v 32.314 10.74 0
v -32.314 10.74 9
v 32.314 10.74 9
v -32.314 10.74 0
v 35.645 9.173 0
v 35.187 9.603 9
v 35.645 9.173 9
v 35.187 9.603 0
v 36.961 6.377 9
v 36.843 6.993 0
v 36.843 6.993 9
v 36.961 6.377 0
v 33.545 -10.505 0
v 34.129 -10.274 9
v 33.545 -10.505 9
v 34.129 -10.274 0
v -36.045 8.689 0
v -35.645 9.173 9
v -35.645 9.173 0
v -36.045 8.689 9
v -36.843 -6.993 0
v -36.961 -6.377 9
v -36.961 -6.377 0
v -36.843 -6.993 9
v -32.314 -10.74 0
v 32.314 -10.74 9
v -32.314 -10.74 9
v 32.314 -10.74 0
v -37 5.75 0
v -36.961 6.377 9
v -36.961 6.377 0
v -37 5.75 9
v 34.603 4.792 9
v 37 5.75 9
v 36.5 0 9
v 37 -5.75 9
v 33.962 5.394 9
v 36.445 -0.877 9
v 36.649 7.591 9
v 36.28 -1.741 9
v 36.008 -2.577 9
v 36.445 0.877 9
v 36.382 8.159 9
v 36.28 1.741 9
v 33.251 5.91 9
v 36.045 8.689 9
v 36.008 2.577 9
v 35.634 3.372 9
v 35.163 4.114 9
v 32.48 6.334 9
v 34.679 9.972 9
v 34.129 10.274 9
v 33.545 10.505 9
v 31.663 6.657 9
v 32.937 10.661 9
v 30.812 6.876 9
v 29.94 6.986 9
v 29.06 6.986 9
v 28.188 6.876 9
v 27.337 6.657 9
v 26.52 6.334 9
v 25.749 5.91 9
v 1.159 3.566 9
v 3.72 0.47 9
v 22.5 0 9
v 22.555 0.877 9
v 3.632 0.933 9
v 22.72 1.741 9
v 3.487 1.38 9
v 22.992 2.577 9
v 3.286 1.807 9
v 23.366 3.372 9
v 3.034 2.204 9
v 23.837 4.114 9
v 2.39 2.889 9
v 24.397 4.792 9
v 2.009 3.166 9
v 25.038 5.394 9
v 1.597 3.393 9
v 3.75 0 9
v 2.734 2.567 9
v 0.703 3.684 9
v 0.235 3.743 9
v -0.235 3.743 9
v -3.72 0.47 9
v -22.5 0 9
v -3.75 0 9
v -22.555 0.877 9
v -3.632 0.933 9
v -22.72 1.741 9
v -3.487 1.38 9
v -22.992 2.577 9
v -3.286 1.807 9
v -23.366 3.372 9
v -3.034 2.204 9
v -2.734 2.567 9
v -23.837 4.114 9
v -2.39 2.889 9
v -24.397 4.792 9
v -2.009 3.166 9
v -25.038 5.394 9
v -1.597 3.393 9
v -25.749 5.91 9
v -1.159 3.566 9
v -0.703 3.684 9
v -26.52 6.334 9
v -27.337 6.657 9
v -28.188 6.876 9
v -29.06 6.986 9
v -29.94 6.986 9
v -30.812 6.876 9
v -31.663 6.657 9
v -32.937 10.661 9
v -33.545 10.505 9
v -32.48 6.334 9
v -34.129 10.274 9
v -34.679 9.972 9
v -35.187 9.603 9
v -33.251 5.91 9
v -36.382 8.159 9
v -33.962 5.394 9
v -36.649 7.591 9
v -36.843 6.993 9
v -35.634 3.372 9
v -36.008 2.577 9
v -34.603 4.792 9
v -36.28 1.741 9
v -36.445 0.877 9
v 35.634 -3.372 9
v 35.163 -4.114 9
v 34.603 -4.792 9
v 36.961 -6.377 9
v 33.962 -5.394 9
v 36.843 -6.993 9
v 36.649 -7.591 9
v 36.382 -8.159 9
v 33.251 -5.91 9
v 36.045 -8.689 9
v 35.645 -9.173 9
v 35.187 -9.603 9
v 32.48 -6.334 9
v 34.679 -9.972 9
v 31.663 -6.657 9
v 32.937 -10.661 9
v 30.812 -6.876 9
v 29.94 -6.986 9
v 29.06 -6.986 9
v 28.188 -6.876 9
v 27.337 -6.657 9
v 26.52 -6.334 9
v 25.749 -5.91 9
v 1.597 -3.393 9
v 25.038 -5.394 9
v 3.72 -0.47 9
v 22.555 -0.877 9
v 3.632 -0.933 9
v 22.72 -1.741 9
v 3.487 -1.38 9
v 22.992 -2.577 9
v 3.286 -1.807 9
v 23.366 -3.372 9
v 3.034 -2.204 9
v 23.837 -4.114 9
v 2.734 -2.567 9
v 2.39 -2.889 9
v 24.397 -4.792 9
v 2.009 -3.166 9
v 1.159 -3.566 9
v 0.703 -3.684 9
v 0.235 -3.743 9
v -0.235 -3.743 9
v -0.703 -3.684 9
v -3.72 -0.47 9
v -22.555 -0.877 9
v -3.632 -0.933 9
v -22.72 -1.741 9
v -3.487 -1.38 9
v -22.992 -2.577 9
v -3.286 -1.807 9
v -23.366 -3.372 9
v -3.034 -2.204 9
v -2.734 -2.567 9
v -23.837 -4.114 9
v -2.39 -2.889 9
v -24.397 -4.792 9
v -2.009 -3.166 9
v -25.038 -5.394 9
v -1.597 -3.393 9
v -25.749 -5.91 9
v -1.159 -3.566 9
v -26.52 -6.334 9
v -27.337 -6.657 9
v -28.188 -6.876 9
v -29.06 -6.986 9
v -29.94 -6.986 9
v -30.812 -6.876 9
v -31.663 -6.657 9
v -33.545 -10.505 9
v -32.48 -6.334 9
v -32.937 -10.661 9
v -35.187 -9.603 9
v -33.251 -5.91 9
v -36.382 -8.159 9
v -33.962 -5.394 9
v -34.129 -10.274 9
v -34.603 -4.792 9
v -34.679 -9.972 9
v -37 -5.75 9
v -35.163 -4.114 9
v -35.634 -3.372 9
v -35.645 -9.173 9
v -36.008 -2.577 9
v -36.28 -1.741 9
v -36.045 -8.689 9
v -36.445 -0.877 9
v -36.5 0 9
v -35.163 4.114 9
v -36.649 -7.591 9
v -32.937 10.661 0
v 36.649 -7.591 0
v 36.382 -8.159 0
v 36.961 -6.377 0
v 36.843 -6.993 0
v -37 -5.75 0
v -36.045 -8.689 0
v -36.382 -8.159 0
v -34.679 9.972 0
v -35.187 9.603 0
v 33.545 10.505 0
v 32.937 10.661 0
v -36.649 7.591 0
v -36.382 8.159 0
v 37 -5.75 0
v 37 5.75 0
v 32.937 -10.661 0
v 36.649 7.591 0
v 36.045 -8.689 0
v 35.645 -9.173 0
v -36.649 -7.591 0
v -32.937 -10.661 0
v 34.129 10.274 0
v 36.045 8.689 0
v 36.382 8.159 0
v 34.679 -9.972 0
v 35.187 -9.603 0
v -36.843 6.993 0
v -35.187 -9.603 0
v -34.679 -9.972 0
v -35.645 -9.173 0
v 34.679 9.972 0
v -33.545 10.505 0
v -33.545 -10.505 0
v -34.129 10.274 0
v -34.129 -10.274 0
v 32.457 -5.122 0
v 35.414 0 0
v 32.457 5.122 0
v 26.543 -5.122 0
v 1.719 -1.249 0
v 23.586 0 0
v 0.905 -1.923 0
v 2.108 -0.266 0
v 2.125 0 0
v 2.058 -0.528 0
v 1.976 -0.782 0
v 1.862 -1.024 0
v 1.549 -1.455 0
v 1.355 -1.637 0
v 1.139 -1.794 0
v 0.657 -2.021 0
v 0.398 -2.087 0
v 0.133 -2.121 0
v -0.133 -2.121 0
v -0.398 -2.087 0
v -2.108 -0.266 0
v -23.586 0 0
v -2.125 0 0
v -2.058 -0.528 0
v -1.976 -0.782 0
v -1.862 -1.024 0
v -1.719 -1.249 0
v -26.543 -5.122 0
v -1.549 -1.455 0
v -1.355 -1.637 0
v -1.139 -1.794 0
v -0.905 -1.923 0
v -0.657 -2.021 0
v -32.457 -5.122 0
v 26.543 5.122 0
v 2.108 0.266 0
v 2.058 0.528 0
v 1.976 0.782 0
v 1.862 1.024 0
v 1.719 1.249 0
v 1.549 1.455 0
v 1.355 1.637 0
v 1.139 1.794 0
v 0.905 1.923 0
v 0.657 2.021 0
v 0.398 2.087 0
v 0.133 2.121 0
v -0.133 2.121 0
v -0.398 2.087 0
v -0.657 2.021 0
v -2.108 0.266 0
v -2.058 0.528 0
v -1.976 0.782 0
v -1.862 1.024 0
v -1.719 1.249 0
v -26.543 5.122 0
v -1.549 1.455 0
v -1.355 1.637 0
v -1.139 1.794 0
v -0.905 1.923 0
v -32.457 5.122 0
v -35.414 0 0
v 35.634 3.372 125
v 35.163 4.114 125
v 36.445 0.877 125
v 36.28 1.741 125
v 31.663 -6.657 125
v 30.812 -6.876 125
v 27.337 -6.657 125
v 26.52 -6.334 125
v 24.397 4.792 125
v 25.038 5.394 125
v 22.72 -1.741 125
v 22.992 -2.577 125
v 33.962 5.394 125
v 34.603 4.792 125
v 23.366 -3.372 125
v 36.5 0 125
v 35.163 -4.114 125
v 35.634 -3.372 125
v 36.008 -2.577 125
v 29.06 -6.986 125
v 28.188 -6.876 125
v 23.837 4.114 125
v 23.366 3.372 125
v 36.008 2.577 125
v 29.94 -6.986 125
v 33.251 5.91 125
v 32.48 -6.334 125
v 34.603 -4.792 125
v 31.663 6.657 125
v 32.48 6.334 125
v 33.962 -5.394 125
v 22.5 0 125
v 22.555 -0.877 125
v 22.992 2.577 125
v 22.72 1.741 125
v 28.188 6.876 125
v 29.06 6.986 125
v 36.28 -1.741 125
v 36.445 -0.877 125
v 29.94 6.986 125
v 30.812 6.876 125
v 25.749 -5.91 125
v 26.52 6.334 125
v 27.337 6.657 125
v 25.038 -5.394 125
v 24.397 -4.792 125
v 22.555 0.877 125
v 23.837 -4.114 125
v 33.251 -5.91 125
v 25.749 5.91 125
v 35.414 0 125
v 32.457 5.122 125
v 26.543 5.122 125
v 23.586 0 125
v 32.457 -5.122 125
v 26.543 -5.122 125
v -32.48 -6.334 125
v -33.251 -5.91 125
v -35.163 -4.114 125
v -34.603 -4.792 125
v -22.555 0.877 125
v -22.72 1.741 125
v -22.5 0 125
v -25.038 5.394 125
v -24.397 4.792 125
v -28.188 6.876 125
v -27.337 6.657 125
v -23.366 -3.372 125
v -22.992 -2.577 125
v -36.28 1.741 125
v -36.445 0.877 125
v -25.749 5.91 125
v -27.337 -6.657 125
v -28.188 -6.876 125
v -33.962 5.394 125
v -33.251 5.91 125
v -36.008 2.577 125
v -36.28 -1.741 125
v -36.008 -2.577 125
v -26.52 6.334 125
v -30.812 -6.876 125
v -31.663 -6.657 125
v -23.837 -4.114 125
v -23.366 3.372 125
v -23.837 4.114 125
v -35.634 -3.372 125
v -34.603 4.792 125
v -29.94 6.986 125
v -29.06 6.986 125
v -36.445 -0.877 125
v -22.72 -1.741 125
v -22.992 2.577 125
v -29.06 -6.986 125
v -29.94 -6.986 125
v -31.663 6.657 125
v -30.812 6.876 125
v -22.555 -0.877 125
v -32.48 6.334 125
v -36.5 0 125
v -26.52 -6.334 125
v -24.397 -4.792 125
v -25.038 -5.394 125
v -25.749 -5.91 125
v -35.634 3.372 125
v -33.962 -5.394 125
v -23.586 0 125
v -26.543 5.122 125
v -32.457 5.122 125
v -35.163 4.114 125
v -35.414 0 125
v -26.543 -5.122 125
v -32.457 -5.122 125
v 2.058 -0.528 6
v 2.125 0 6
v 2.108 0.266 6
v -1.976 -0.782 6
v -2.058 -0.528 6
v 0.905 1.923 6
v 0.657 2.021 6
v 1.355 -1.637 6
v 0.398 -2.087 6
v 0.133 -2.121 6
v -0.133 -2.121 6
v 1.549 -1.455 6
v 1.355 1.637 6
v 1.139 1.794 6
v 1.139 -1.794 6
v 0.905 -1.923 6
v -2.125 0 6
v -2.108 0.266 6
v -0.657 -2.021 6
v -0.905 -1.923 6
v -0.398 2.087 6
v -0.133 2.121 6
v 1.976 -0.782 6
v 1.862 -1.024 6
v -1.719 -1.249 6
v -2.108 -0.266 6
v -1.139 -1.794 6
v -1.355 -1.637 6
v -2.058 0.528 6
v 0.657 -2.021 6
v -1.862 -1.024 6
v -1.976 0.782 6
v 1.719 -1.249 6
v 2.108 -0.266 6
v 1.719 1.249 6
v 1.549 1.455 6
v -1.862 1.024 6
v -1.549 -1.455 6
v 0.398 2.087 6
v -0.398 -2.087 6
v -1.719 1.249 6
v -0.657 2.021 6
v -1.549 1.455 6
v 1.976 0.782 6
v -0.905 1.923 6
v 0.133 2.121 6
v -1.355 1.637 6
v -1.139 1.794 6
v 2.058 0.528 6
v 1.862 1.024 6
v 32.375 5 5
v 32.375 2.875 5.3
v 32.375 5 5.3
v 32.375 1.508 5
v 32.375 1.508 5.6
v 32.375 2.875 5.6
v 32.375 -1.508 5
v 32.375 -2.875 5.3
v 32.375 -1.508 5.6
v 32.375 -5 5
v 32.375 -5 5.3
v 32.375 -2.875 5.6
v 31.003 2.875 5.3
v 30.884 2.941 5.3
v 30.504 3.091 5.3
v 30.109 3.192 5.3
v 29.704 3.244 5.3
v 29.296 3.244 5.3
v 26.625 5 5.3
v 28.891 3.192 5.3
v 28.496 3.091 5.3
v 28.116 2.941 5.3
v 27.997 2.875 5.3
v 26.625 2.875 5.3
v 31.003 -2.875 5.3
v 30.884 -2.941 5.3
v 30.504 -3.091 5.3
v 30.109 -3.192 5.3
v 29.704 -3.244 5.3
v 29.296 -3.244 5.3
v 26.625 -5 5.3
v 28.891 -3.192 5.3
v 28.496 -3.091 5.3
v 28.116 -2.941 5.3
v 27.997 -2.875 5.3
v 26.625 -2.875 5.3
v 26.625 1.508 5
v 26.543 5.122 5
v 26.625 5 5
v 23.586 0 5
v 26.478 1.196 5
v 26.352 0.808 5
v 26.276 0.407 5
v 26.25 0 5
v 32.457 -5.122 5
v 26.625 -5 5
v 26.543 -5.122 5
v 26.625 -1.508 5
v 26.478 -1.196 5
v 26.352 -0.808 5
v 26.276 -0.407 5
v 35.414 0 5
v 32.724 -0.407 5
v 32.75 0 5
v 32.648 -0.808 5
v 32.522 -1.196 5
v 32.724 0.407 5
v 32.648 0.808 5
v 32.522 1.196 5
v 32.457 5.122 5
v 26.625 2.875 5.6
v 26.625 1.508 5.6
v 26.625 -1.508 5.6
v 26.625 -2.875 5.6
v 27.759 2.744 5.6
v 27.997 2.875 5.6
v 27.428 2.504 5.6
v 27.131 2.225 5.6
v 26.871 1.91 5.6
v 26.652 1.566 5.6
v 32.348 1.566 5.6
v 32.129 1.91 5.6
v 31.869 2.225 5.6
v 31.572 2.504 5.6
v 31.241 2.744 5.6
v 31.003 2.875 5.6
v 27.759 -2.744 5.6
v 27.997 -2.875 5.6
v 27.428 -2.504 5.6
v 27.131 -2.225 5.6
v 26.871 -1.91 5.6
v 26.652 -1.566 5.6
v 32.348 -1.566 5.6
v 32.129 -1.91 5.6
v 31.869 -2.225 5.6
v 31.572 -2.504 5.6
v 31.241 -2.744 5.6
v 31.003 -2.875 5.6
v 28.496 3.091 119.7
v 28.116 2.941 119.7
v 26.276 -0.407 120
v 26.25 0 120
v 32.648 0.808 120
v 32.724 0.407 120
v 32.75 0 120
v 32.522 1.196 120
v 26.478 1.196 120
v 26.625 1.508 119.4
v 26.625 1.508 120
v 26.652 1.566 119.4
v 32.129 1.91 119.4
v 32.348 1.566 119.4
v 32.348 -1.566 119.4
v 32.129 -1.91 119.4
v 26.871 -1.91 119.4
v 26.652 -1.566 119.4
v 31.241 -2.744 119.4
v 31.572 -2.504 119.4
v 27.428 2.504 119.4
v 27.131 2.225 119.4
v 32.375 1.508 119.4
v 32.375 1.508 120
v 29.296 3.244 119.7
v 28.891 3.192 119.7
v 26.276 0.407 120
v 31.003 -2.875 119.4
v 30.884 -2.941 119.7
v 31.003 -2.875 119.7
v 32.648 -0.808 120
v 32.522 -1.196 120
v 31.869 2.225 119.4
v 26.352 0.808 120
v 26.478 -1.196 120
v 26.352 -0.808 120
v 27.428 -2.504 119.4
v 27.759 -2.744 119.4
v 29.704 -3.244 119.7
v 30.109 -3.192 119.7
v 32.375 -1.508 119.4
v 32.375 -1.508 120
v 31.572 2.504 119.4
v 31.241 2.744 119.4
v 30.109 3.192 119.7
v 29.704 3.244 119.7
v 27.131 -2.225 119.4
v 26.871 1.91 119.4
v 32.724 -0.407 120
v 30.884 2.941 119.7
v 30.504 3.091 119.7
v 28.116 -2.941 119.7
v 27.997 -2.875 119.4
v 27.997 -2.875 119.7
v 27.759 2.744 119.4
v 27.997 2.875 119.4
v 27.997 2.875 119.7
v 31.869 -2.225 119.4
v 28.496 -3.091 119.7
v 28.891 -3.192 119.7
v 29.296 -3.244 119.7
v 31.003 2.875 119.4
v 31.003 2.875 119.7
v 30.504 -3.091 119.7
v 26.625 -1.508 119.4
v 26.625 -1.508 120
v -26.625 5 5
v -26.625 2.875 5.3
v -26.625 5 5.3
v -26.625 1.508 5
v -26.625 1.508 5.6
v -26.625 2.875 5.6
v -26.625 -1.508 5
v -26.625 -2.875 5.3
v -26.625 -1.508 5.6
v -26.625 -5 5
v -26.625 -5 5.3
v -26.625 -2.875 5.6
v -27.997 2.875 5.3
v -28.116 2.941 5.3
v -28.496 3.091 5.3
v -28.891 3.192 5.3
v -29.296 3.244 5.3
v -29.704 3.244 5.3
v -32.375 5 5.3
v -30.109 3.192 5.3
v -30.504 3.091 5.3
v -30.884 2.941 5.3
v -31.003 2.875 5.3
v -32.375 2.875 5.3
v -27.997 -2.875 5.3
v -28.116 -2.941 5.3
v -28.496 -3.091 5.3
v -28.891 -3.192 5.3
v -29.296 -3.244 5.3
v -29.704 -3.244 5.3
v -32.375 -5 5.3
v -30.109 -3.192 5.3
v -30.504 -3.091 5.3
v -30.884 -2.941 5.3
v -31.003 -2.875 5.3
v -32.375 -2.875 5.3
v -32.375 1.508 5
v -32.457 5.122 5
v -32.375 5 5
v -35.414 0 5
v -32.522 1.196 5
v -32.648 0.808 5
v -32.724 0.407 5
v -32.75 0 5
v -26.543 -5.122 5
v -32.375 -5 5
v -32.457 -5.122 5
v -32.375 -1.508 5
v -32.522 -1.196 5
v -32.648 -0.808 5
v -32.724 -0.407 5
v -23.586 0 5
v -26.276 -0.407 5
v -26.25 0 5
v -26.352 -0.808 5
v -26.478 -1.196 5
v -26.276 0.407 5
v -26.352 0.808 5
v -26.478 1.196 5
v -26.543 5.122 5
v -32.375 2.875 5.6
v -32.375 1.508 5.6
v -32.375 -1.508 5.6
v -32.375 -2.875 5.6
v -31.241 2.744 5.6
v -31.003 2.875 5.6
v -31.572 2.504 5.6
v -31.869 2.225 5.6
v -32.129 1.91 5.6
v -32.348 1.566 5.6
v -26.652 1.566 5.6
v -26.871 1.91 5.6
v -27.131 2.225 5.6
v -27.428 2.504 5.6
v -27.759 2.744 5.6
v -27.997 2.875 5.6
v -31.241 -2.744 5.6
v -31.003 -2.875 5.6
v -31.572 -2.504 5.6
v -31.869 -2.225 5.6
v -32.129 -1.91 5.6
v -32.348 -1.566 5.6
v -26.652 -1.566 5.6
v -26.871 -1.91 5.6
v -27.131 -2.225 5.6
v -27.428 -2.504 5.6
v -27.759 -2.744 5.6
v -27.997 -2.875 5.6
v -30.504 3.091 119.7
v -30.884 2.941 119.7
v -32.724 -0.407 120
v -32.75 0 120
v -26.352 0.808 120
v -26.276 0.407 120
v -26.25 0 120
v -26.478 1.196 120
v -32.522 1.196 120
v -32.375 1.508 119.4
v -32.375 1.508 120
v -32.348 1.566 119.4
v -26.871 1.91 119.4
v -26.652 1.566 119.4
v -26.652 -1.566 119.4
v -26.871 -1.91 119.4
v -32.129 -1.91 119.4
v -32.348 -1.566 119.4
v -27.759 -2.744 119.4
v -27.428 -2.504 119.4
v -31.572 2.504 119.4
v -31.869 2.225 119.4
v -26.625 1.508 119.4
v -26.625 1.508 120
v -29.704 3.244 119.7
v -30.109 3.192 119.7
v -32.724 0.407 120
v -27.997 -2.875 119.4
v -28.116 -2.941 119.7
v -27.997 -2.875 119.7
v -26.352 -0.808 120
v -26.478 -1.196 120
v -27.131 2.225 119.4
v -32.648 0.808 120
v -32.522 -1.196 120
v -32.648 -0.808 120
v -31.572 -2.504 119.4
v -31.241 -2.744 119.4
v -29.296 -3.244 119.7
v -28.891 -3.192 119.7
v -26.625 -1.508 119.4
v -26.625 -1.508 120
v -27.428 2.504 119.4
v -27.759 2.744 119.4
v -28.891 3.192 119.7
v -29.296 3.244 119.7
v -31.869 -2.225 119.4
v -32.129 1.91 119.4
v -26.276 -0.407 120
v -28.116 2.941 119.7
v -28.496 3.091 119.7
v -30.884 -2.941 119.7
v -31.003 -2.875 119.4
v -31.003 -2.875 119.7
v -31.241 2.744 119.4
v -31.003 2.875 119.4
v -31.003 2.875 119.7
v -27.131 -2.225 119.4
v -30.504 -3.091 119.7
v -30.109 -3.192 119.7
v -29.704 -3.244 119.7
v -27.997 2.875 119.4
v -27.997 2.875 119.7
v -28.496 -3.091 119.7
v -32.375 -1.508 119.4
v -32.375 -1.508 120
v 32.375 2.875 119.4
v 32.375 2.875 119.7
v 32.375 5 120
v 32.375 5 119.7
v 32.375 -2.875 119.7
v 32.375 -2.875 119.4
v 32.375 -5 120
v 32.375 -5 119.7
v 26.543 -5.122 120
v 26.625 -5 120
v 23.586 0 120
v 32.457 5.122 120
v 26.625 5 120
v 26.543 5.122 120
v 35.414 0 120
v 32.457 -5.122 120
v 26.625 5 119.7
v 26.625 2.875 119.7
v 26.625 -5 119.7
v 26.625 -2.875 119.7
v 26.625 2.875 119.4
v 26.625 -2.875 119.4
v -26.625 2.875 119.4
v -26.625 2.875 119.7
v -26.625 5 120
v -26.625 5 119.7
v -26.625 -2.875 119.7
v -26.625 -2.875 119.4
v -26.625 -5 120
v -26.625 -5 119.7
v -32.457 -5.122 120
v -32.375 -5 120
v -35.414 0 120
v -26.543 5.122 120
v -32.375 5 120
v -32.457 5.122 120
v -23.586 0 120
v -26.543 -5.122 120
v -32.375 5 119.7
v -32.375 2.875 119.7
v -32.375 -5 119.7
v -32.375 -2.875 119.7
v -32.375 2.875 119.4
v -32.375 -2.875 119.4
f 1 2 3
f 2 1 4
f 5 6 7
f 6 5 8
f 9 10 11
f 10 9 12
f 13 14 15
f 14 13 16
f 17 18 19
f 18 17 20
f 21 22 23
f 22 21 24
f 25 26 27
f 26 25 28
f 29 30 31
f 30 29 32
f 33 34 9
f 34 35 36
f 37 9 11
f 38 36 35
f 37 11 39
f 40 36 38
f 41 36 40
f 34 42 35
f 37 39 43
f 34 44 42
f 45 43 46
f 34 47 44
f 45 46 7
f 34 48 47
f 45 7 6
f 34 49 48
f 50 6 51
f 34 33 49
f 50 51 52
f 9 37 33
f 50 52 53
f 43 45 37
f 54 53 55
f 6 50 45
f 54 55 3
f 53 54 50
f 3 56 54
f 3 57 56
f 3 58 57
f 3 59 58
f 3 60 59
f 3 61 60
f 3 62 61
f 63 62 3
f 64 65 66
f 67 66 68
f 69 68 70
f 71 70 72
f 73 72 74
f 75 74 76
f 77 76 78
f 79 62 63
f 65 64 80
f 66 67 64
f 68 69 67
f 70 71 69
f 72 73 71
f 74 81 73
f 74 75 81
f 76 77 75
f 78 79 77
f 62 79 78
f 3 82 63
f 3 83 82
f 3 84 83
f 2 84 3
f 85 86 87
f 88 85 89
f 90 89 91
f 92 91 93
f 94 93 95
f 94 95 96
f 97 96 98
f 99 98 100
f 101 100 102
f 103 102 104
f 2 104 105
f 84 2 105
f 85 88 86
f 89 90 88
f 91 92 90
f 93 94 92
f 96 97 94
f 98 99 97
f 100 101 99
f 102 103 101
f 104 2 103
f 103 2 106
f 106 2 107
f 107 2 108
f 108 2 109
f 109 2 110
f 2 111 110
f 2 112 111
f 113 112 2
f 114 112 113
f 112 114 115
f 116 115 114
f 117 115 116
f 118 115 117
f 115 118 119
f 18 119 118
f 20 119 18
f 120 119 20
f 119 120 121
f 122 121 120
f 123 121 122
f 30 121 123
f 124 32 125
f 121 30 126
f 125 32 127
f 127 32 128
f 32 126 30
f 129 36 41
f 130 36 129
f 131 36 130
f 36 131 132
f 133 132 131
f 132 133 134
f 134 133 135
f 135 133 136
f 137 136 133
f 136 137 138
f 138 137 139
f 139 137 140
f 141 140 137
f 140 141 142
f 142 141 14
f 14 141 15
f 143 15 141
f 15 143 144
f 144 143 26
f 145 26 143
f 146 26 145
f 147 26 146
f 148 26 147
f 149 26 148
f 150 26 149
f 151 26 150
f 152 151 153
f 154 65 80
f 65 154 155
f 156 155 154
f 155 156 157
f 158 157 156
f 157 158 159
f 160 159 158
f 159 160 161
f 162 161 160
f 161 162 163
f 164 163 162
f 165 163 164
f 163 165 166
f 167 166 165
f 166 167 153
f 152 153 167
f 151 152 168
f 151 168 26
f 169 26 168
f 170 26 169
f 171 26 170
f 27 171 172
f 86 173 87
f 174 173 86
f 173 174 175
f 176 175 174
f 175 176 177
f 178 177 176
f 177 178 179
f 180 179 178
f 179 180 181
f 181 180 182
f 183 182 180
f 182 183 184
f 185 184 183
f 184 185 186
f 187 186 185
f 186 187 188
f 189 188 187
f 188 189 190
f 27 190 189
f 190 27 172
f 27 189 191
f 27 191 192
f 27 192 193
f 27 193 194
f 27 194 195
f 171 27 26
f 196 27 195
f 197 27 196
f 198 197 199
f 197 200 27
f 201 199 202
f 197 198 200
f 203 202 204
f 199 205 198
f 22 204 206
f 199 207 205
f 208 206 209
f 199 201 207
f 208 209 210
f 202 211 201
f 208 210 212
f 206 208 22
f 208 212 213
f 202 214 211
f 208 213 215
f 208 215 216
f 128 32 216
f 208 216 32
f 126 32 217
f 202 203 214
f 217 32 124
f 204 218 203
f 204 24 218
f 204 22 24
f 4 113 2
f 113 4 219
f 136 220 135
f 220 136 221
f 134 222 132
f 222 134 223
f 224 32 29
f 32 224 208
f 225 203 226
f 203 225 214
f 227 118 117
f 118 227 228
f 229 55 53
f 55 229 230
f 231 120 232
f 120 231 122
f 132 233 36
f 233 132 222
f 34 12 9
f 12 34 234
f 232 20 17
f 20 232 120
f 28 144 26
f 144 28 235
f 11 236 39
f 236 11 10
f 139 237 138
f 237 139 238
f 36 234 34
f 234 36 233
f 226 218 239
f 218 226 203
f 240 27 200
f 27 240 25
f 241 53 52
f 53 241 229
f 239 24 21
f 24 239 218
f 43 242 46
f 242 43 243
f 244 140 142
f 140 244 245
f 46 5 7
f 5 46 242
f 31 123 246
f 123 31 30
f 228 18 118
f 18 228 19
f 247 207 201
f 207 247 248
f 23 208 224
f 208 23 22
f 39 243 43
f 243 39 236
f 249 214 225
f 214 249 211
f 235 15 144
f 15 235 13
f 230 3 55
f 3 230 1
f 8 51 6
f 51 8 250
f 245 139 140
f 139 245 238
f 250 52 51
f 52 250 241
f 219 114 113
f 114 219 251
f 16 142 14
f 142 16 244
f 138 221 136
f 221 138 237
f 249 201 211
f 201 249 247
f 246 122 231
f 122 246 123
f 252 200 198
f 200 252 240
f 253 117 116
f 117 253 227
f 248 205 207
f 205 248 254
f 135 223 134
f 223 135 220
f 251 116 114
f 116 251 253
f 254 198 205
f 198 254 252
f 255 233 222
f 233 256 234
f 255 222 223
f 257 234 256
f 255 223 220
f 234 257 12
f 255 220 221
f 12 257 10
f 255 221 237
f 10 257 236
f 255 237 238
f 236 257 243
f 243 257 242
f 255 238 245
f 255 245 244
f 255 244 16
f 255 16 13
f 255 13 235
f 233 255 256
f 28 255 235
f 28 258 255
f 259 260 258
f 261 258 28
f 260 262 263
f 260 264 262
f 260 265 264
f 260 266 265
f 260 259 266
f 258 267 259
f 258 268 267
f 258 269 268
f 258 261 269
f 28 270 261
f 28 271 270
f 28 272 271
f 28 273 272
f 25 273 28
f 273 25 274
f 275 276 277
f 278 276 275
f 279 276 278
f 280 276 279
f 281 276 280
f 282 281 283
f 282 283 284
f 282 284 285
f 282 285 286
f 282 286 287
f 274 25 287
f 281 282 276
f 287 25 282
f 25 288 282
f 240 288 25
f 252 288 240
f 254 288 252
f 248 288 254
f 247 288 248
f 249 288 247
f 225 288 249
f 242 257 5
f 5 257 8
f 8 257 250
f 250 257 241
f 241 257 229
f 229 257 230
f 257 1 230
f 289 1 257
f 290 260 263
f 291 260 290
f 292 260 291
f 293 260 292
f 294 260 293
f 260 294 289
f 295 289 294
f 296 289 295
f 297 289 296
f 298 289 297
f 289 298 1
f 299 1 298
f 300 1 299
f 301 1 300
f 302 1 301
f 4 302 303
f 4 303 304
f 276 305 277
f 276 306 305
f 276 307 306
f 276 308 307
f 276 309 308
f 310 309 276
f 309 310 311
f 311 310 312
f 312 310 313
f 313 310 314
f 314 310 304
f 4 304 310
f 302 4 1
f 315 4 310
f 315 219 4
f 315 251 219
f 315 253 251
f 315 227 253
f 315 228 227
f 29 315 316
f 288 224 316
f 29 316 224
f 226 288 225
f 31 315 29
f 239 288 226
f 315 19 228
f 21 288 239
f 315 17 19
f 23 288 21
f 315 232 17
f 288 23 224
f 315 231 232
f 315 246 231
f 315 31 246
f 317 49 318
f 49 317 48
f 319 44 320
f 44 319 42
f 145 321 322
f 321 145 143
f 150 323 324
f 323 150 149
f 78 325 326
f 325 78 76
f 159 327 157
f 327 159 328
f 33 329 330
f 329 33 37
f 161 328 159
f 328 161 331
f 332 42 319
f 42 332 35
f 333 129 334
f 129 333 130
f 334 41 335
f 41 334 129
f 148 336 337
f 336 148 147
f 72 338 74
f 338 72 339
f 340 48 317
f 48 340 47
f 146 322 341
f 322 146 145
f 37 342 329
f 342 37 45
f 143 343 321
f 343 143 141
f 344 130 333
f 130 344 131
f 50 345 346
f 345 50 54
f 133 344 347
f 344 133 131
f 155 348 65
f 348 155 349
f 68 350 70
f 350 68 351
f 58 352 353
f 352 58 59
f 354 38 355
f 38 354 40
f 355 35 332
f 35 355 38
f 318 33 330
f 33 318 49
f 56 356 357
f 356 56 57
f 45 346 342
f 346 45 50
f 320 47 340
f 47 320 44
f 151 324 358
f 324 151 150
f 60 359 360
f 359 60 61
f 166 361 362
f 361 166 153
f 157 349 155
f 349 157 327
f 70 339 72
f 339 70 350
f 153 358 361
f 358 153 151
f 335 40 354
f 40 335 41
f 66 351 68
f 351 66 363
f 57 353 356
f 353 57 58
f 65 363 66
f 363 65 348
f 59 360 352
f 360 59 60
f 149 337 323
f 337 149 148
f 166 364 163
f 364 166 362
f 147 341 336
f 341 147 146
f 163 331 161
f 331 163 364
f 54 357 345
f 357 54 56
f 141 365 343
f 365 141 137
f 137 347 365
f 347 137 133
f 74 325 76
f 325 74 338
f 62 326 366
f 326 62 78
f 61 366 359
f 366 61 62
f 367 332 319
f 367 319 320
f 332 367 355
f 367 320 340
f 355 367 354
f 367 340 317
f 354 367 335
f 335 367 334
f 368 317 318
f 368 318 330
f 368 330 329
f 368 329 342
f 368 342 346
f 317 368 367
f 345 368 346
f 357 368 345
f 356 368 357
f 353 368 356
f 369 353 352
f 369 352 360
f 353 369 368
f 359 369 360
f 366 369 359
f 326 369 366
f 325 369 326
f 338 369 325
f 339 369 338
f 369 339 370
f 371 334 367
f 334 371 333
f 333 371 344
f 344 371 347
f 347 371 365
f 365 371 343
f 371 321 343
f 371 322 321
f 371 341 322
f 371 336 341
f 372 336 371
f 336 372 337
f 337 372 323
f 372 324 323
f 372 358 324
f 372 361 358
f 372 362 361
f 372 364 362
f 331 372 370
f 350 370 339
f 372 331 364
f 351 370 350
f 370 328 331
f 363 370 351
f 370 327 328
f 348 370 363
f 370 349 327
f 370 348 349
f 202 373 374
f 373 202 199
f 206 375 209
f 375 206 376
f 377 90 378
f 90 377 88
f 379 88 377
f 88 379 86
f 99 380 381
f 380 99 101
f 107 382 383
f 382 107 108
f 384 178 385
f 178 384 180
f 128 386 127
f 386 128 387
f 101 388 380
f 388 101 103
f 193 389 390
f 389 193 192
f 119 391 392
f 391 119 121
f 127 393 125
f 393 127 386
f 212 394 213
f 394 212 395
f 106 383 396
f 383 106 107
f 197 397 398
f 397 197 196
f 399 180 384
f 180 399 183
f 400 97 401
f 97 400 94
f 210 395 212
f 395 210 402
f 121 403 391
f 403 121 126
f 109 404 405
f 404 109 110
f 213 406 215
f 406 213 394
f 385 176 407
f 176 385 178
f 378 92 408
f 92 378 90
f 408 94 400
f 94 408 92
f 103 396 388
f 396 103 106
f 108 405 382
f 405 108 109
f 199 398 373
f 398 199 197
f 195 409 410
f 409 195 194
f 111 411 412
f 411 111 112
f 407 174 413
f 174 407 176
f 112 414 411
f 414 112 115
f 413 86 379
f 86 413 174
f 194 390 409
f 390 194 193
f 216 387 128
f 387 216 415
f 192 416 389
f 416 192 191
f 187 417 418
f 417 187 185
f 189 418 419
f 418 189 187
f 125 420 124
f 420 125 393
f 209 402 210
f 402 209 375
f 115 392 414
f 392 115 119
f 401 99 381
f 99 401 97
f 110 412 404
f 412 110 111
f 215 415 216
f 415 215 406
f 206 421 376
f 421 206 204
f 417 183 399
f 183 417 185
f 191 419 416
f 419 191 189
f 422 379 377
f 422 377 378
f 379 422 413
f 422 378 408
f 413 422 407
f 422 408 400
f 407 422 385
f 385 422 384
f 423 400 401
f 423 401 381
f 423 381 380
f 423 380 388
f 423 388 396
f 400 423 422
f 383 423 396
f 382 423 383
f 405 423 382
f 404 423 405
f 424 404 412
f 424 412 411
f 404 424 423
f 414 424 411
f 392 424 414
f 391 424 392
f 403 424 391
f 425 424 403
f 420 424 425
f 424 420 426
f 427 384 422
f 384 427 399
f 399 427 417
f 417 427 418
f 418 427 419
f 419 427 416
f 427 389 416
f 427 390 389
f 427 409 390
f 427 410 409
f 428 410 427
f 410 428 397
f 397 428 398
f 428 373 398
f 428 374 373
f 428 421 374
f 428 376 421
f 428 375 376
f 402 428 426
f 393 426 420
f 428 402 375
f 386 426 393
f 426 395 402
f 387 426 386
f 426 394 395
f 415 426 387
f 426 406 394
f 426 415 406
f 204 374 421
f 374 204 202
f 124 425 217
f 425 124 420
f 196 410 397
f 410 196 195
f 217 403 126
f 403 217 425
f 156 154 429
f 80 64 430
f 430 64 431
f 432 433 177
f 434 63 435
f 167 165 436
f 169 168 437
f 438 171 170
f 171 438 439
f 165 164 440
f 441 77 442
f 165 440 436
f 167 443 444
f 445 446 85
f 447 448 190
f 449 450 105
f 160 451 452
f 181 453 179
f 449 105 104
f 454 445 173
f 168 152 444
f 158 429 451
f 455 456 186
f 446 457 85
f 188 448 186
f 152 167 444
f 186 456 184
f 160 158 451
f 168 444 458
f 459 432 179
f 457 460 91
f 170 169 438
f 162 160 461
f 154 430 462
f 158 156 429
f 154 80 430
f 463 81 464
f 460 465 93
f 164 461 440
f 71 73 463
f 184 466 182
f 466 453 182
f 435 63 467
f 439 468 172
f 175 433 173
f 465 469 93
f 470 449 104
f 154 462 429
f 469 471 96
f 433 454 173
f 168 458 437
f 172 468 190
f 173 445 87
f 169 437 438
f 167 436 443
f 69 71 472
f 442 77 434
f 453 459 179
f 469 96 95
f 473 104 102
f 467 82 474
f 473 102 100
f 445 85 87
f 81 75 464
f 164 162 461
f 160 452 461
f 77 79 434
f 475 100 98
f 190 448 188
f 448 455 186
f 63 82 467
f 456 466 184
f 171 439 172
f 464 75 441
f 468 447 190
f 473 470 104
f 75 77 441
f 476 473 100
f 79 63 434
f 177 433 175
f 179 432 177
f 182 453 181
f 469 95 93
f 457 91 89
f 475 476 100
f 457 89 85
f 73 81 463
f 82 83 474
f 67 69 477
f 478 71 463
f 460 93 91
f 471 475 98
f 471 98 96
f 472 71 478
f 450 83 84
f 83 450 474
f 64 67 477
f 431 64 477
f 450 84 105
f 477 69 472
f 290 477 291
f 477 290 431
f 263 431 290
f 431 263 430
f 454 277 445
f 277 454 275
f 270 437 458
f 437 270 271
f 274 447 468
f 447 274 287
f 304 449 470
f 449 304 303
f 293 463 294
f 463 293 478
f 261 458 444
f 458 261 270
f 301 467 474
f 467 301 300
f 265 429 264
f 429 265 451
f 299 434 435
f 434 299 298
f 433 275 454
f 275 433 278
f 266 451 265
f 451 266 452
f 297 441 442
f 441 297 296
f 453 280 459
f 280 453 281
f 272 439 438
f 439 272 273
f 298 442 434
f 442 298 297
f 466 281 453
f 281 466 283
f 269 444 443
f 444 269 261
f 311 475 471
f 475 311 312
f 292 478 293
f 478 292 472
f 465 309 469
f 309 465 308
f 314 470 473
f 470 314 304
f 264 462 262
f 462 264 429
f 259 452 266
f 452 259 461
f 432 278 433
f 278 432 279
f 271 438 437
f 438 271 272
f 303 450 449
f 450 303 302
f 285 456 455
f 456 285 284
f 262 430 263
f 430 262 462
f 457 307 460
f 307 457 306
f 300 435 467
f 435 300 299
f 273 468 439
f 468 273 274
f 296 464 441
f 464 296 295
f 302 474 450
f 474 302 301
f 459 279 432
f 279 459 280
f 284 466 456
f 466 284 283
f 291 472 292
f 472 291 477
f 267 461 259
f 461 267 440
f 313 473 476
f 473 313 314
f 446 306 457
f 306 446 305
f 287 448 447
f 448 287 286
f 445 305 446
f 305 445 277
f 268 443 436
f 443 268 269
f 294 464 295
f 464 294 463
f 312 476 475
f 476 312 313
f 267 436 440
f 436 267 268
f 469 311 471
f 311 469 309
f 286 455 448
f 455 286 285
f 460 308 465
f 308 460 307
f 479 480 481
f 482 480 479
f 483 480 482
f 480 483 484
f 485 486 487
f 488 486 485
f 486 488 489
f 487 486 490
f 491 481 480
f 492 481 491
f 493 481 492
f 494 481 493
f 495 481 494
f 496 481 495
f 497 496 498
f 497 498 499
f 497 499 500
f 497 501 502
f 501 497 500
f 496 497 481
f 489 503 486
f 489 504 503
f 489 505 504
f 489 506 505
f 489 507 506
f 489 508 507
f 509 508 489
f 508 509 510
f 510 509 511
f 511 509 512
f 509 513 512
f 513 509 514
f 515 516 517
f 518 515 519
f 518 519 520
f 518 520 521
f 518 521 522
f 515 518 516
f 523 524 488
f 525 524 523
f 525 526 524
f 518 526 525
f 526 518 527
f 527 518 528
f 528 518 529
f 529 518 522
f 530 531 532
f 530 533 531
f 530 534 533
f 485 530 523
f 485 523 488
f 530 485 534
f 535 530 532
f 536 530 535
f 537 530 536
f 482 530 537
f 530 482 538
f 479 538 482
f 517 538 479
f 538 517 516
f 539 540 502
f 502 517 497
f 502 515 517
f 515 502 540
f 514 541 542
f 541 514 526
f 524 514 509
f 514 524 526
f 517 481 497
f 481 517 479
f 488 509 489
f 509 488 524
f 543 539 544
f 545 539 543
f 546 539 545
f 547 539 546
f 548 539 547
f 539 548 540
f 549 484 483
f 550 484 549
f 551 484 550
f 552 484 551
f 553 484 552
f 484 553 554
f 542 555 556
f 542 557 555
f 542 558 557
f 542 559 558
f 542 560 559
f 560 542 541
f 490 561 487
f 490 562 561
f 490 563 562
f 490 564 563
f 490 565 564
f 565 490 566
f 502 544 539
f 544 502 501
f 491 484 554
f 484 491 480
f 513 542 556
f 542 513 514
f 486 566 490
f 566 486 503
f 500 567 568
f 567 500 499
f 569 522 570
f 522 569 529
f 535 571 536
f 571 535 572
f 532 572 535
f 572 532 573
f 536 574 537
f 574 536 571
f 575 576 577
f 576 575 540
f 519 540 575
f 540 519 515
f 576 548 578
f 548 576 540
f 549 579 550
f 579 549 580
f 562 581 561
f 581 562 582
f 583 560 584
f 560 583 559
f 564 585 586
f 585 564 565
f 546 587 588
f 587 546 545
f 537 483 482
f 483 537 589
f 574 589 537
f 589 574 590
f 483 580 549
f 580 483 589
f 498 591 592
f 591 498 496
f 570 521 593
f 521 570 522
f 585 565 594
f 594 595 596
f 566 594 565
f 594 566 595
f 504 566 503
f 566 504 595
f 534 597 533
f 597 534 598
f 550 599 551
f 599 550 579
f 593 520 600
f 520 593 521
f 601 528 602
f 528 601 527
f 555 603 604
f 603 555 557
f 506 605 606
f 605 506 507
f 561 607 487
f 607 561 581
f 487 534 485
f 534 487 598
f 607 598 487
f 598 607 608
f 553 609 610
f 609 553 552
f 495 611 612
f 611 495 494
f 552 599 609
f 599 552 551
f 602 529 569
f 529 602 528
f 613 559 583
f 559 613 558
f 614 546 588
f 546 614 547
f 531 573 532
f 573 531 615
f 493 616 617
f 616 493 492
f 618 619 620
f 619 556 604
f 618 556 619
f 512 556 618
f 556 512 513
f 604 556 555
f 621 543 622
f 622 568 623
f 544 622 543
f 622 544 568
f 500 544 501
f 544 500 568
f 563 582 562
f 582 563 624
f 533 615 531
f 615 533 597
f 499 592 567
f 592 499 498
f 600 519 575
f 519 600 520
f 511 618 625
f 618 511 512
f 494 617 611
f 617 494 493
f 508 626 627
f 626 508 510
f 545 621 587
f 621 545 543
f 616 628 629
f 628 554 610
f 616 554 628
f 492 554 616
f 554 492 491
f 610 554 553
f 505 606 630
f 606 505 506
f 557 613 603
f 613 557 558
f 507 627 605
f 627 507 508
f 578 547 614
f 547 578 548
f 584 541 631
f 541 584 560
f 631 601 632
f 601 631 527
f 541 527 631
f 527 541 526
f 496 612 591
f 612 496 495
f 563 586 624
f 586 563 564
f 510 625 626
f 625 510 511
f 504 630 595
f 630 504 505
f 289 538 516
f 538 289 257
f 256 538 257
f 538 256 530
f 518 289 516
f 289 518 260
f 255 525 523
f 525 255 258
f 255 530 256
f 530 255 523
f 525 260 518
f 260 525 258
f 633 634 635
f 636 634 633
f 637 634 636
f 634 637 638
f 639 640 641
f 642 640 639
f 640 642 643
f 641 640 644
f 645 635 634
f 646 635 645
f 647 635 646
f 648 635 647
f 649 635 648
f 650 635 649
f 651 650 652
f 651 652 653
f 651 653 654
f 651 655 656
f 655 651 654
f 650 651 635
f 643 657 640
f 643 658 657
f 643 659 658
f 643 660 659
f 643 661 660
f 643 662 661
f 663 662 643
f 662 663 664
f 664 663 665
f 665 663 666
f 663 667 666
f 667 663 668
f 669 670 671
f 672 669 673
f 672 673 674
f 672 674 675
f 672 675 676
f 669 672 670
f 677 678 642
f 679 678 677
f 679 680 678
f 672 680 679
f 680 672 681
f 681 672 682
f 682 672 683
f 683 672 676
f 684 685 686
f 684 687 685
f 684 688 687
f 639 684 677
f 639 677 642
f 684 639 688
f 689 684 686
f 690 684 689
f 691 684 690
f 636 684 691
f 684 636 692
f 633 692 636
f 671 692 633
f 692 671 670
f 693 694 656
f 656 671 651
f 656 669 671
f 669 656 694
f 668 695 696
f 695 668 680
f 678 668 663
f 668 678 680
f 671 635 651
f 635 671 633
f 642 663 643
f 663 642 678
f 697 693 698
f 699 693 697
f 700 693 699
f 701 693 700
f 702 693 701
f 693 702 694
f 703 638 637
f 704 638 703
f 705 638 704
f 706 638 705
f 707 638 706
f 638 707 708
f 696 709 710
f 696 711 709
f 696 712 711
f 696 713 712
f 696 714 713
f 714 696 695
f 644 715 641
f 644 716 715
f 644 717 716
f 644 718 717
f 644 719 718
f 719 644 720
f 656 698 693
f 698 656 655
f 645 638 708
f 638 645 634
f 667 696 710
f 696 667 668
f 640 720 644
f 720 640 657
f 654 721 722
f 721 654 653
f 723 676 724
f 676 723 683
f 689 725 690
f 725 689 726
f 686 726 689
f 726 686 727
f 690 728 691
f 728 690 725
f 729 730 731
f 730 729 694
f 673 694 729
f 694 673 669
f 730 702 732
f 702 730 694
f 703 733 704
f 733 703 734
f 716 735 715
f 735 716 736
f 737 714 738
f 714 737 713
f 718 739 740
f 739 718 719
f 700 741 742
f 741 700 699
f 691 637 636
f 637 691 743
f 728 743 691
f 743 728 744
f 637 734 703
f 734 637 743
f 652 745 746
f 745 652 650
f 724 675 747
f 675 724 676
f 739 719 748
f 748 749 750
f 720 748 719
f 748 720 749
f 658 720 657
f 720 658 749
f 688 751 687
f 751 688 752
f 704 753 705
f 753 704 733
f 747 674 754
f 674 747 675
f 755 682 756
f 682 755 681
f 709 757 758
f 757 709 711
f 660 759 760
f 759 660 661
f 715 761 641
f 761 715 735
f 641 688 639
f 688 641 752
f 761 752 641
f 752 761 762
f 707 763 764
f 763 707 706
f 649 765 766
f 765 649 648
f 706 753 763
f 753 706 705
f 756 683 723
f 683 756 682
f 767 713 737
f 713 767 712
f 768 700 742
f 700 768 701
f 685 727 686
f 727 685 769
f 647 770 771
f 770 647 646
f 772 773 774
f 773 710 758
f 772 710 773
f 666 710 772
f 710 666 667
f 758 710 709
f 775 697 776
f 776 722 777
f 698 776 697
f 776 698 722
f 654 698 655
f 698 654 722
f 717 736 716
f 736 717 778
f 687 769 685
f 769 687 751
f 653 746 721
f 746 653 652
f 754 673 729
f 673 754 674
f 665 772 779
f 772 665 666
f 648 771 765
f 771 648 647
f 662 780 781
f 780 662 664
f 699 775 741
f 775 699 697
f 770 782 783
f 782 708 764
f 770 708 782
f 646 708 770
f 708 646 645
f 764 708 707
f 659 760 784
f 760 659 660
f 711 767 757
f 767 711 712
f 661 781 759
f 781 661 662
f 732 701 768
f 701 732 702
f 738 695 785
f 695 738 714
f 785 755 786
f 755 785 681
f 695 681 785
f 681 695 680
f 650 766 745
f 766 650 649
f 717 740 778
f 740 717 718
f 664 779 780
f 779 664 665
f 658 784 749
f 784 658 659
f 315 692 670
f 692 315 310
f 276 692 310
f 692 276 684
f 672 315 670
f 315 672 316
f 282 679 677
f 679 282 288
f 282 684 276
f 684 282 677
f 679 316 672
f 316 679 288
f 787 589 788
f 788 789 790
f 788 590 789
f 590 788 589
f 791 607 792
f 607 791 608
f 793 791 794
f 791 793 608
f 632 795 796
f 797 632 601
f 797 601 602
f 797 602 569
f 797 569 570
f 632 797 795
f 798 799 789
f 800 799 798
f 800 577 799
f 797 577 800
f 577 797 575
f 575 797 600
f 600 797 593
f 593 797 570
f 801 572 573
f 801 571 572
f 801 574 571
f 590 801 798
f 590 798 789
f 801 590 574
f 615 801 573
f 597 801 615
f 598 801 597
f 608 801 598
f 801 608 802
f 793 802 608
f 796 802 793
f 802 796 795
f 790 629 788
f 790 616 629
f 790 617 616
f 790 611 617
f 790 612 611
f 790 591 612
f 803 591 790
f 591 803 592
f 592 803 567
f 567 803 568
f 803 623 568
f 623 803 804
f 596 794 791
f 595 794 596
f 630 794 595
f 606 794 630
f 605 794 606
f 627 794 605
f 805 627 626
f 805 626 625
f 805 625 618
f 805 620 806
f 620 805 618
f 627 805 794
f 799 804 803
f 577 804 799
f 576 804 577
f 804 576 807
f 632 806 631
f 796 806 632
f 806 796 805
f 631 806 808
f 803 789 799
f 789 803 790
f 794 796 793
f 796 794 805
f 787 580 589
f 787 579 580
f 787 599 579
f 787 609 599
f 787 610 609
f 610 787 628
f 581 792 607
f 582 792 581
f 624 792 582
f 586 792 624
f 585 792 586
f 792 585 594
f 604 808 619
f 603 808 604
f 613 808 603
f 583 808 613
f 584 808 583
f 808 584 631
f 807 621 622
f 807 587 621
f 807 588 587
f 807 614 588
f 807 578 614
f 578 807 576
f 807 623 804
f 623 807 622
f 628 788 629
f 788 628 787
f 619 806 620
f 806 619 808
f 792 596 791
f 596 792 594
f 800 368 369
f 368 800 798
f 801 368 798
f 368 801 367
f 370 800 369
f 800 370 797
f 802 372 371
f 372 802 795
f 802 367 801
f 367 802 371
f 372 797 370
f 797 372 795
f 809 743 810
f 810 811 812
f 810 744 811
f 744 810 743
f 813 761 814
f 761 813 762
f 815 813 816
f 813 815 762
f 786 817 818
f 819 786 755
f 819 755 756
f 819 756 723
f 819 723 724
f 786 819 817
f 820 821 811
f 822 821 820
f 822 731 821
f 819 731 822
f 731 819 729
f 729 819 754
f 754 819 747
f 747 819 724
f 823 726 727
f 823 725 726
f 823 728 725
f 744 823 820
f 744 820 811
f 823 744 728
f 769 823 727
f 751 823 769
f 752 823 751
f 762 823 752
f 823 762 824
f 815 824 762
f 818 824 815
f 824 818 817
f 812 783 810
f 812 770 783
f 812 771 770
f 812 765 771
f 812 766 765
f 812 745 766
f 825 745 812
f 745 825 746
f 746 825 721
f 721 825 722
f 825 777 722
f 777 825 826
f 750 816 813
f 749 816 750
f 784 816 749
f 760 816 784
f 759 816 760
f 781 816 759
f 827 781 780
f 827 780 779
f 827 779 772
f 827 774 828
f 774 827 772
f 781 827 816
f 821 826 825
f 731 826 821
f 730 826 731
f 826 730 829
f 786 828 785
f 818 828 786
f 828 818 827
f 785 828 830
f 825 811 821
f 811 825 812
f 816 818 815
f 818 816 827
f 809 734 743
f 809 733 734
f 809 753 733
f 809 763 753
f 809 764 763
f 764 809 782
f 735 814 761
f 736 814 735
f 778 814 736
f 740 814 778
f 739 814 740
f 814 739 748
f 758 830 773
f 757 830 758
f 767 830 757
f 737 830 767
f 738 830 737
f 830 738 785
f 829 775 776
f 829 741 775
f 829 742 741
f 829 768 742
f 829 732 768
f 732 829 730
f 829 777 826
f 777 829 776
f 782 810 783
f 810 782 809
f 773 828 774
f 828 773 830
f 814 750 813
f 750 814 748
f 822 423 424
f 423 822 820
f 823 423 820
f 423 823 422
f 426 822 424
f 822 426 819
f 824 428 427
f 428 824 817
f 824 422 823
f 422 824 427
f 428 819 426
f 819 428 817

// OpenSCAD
$fn = 50;


difference() {
	union() {
		hull() {
			translate(v = [-32.0000000000, 5.7500000000, 0]) {
				cylinder(h = 9, r = 5);
			}
			translate(v = [32.0000000000, 5.7500000000, 0]) {
				cylinder(h = 9, r = 5);
			}
			translate(v = [-32.0000000000, -5.7500000000, 0]) {
				cylinder(h = 9, r = 5);
			}
			translate(v = [32.0000000000, -5.7500000000, 0]) {
				cylinder(h = 9, r = 5);
			}
		}
		translate(v = [29.5000000000, 0, 0.0000000000]) {
			cylinder(h = 125, r = 7.0000000000);
		}
		translate(v = [-29.5000000000, 0, 0.0000000000]) {
			cylinder(h = 125, r = 7.0000000000);
		}
		translate(v = [29.5000000000, 0, 119.0000000000]) {
			cylinder(h = 6, r = 7.0000000000);
		}
		translate(v = [-29.5000000000, 0, 119.0000000000]) {
			cylinder(h = 6, r = 7.0000000000);
		}
	}
	union() {
		translate(v = [0, 0, 9]) {
			rotate(a = [0, 0, 0]) {
				difference() {
					union() {
						#translate(v = [0, 0, -120.0000000000]) {
							cylinder(h = 120, r = 2.0000000000);
						}
						#translate(v = [0, 0, -3]) {
							cylinder(h = 3, r1 = 2.1250000000, r2 = 3.7500000000);
						}
						#translate(v = [0, 0, -120.0000000000]) {
							cylinder(h = 120, r = 2.1250000000);
						}
						#translate(v = [0, 0, -120.0000000000]) {
							cylinder(h = 120, r = 2.0000000000);
						}
					}
					union();
				}
			}
		}
		translate(v = [29.5000000000, 0, 0]) {
			rotate(a = [0, 0, 0]) {
				difference() {
					union() {
						#translate(v = [-2.8750000000, -5.0000000000, -0.3000000000]) {
							cube(size = [5.7500000000, 10, 0.3000000000]);
						}
						#translate(v = [-2.8750000000, -2.8750000000, -0.6000000000]) {
							cube(size = [5.7500000000, 5.7500000000, 0.3000000000]);
						}
						#translate(v = [-2.8750000000, -5.0000000000, 5]) {
							cube(size = [5.7500000000, 10, 0.3000000000]);
						}
						#translate(v = [-2.8750000000, -2.8750000000, 5.3000000000]) {
							cube(size = [5.7500000000, 5.7500000000, 0.3000000000]);
						}
						#translate(v = [0, 0, -100.0000000000]) {
							cylinder(h = 200, r = 3.2500000000);
						}
						#linear_extrude(height = 5) {
							polygon(points = [[5.9142500000, 0.0000000000], [2.9571250000, 5.1218907443], [-2.9571250000, 5.1218907443], [-5.9142500000, 0.0000000000], [-2.9571250000, -5.1218907443], [2.9571250000, -5.1218907443]]);
						}
						#translate(v = [-2.8750000000, -5.0000000000, -0.3000000000]) {
							cube(size = [5.7500000000, 10, 0.3000000000]);
						}
						#translate(v = [-2.8750000000, -2.8750000000, -0.6000000000]) {
							cube(size = [5.7500000000, 5.7500000000, 0.3000000000]);
						}
						#translate(v = [-2.8750000000, -5.0000000000, 5]) {
							cube(size = [5.7500000000, 10, 0.3000000000]);
						}
						#translate(v = [-2.8750000000, -2.8750000000, 5.3000000000]) {
							cube(size = [5.7500000000, 5.7500000000, 0.3000000000]);
						}
						#translate(v = [0, 0, -100.0000000000]) {
							cylinder(h = 200, r = 3.2500000000);
						}
						#translate(v = [-2.8750000000, -5.0000000000, -0.3000000000]) {
							cube(size = [5.7500000000, 10, 0.3000000000]);
						}
						#translate(v = [-2.8750000000, -2.8750000000, -0.6000000000]) {
							cube(size = [5.7500000000, 5.7500000000, 0.3000000000]);
						}
						#translate(v = [-2.8750000000, -5.0000000000, 5]) {
							cube(size = [5.7500000000, 10, 0.3000000000]);
						}
						#translate(v = [-2.8750000000, -2.8750000000, 5.3000000000]) {
							cube(size = [5.7500000000, 5.7500000000, 0.3000000000]);
						}
						#translate(v = [0, 0, -100.0000000000]) {
							cylinder(h = 200, r = 3.2500000000);
						}
					}
					union();
				}
			}
		}
		translate(v = [-29.5000000000, 0, 0]) {
			rotate(a = [0, 0, 0]) {
				difference() {
					union() {
						#translate(v = [-2.8750000000, -5.0000000000, -0.3000000000]) {
							cube(size = [5.7500000000, 10, 0.3000000000]);
						}
						#translate(v = [-2.8750000000, -2.8750000000, -0.6000000000]) {
							cube(size = [5.7500000000, 5.7500000000, 0.3000000000]);
						}
						#translate(v = [-2.8750000000, -5.0000000000, 5]) {
							cube(size = [5.7500000000, 10, 0.3000000000]);
						}
						#translate(v = [-2.8750000000, -2.8750000000, 5.3000000000]) {
							cube(size = [5.7500000000, 5.7500000000, 0.3000000000]);
						}
						#translate(v = [0, 0, -100.0000000000]) {
							cylinder(h = 200, r = 3.2500000000);
						}
						#linear_extrude(height = 5) {
							polygon(points = [[5.9142500000, 0.0000000000], [2.9571250000, 5.1218907443], [-2.9571250000, 5.1218907443], [-5.9142500000, 0.0000000000], [-2.9571250000, -5.1218907443], [2.9571250000, -5.1218907443]]);
						}
						#translate(v = [-2.8750000000, -5.0000000000, -0.3000000000]) {
							cube(size = [5.7500000000, 10, 0.3000000000]);
						}
						#translate(v = [-2.8750000000, -2.8750000000, -0.6000000000]) {
							cube(size = [5.7500000000, 5.7500000000, 0.3000000000]);
						}
						#translate(v = [-2.8750000000, -5.0000000000, 5]) {
							cube(size = [5.7500000000, 10, 0.3000000000]);
						}
						#translate(v = [-2.8750000000, -2.8750000000, 5.3000000000]) {
							cube(size = [5.7500000000, 5.7500000000, 0.3000000000]);
						}
						#translate(v = [0, 0, -100.0000000000]) {
							cylinder(h = 200, r = 3.2500000000);
						}
						#translate(v = [-2.8750000000, -5.0000000000, -0.3000000000]) {
							cube(size = [5.7500000000, 10, 0.3000000000]);
						}
						#translate(v = [-2.8750000000, -2.8750000000, -0.6000000000]) {
							cube(size = [5.7500000000, 5.7500000000, 0.3000000000]);
						}
						#translate(v = [-2.8750000000, -5.0000000000, 5]) {
							cube(size = [5.7500000000, 10, 0.3000000000]);
						}
						#translate(v = [-2.8750000000, -2.8750000000, 5.3000000000]) {
							cube(size = [5.7500000000, 5.7500000000, 0.3000000000]);
						}
						#translate(v = [0, 0, -100.0000000000]) {
							cylinder(h = 200, r = 3.2500000000);
						}
					}
					union();
				}
			}
		}
		translate(v = [29.5000000000, 0, 125]) {
			rotate(a = [0, 0, 0]) {
				difference() {
					union() {
						#translate(v = [-2.8750000000, -5.0000000000, -5.3000000000]) {
							cube(size = [5.7500000000, 10, 0.3000000000]);
						}
						#translate(v = [-2.8750000000, -2.8750000000, -5.6000000000]) {
							cube(size = [5.7500000000, 5.7500000000, 0.3000000000]);
						}
						#translate(v = [-2.8750000000, -5.0000000000, 0]) {
							cube(size = [5.7500000000, 10, 0.3000000000]);
						}
						#translate(v = [-2.8750000000, -2.8750000000, 0.3000000000]) {
							cube(size = [5.7500000000, 5.7500000000, 0.3000000000]);
						}
						#translate(v = [0, 0, -100.0000000000]) {
							cylinder(h = 200, r = 3.2500000000);
						}
						translate(v = [0, 0, -5]) {
							#linear_extrude(height = 5) {
								polygon(points = [[5.9142500000, 0.0000000000], [2.9571250000, 5.1218907443], [-2.9571250000, 5.1218907443], [-5.9142500000, 0.0000000000], [-2.9571250000, -5.1218907443], [2.9571250000, -5.1218907443]]);
							}
						}
						#translate(v = [-2.8750000000, -5.0000000000, -5.3000000000]) {
							cube(size = [5.7500000000, 10, 0.3000000000]);
						}
						#translate(v = [-2.8750000000, -2.8750000000, -5.6000000000]) {
							cube(size = [5.7500000000, 5.7500000000, 0.3000000000]);
						}
						#translate(v = [-2.8750000000, -5.0000000000, 0]) {
							cube(size = [5.7500000000, 10, 0.3000000000]);
						}
						#translate(v = [-2.8750000000, -2.8750000000, 0.3000000000]) {
							cube(size = [5.7500000000, 5.7500000000, 0.3000000000]);
						}
						#translate(v = [0, 0, -100.0000000000]) {
							cylinder(h = 200, r = 3.2500000000);
						}
						#translate(v = [-2.8750000000, -5.0000000000, -5.3000000000]) {
							cube(size = [5.7500000000, 10, 0.3000000000]);
						}
						#translate(v = [-2.8750000000, -2.8750000000, -5.6000000000]) {
							cube(size = [5.7500000000, 5.7500000000, 0.3000000000]);
						}
						#translate(v = [-2.8750000000, -5.0000000000, 0]) {
							cube(size = [5.7500000000, 10, 0.3000000000]);
						}
						#translate(v = [-2.8750000000, -2.8750000000, 0.3000000000]) {
							cube(size = [5.7500000000, 5.7500000000, 0.3000000000]);
						}
						#translate(v = [0, 0, -100.0000000000]) {
							cylinder(h = 200, r = 3.2500000000);
						}
					}
					union();
				}
			}
		}
		translate(v = [-29.5000000000, 0, 125]) {
			rotate(a = [0, 0, 0]) {
				difference() {
					union() {
						#translate(v = [-2.8750000000, -5.0000000000, -5.3000000000]) {
							cube(size = [5.7500000000, 10, 0.3000000000]);
						}
						#translate(v = [-2.8750000000, -2.8750000000, -5.6000000000]) {
							cube(size = [5.7500000000, 5.7500000000, 0.3000000000]);
						}
						#translate(v = [-2.8750000000, -5.0000000000, 0]) {
							cube(size = [5.7500000000, 10, 0.3000000000]);
						}
						#translate(v = [-2.8750000000, -2.8750000000, 0.3000000000]) {
							cube(size = [5.7500000000, 5.7500000000, 0.3000000000]);
						}
						#translate(v = [0, 0, -100.0000000000]) {
							cylinder(h = 200, r = 3.2500000000);
						}
						translate(v = [0, 0, -5]) {
							#linear_extrude(height = 5) {
								polygon(points = [[5.9142500000, 0.0000000000], [2.9571250000, 5.1218907443], [-2.9571250000, 5.1218907443], [-5.9142500000, 0.0000000000], [-2.9571250000, -5.1218907443], [2.9571250000, -5.1218907443]]);
							}
						}
						#translate(v = [-2.8750000000, -5.0000000000, -5.3000000000]) {
							cube(size = [5.7500000000, 10, 0.3000000000]);
						}
						#translate(v = [-2.8750000000, -2.8750000000, -5.6000000000]) {
							cube(size = [5.7500000000, 5.7500000000, 0.3000000000]);
						}
						#translate(v = [-2.8750000000, -5.0000000000, 0]) {
							cube(size = [5.7500000000, 10, 0.3000000000]);
						}
						#translate(v = [-2.8750000000, -2.8750000000, 0.3000000000]) {
							cube(size = [5.7500000000, 5.7500000000, 0.3000000000]);
						}
						#translate(v = [0, 0, -100.0000000000]) {
							cylinder(h = 200, r = 3.2500000000);
						}
						#translate(v = [-2.8750000000, -5.0000000000, -5.3000000000]) {
							cube(size = [5.7500000000, 10, 0.3000000000]);
						}
						#translate(v = [-2.8750000000, -2.8750000000, -5.6000000000]) {
							cube(size = [5.7500000000, 5.7500000000, 0.3000000000]);
						}
						#translate(v = [-2.8750000000, -5.0000000000, 0]) {
							cube(size = [5.7500000000, 10, 0.3000000000]);
						}
						#translate(v = [-2.8750000000, -2.8750000000, 0.3000000000]) {
							cube(size = [5.7500000000, 5.7500000000, 0.3000000000]);
						}
						#translate(v = [0, 0, -100.0000000000]) {
							cylinder(h = 200, r = 3.2500000000);
						}
					}
					union();
				}
			}
		}
	}
}
